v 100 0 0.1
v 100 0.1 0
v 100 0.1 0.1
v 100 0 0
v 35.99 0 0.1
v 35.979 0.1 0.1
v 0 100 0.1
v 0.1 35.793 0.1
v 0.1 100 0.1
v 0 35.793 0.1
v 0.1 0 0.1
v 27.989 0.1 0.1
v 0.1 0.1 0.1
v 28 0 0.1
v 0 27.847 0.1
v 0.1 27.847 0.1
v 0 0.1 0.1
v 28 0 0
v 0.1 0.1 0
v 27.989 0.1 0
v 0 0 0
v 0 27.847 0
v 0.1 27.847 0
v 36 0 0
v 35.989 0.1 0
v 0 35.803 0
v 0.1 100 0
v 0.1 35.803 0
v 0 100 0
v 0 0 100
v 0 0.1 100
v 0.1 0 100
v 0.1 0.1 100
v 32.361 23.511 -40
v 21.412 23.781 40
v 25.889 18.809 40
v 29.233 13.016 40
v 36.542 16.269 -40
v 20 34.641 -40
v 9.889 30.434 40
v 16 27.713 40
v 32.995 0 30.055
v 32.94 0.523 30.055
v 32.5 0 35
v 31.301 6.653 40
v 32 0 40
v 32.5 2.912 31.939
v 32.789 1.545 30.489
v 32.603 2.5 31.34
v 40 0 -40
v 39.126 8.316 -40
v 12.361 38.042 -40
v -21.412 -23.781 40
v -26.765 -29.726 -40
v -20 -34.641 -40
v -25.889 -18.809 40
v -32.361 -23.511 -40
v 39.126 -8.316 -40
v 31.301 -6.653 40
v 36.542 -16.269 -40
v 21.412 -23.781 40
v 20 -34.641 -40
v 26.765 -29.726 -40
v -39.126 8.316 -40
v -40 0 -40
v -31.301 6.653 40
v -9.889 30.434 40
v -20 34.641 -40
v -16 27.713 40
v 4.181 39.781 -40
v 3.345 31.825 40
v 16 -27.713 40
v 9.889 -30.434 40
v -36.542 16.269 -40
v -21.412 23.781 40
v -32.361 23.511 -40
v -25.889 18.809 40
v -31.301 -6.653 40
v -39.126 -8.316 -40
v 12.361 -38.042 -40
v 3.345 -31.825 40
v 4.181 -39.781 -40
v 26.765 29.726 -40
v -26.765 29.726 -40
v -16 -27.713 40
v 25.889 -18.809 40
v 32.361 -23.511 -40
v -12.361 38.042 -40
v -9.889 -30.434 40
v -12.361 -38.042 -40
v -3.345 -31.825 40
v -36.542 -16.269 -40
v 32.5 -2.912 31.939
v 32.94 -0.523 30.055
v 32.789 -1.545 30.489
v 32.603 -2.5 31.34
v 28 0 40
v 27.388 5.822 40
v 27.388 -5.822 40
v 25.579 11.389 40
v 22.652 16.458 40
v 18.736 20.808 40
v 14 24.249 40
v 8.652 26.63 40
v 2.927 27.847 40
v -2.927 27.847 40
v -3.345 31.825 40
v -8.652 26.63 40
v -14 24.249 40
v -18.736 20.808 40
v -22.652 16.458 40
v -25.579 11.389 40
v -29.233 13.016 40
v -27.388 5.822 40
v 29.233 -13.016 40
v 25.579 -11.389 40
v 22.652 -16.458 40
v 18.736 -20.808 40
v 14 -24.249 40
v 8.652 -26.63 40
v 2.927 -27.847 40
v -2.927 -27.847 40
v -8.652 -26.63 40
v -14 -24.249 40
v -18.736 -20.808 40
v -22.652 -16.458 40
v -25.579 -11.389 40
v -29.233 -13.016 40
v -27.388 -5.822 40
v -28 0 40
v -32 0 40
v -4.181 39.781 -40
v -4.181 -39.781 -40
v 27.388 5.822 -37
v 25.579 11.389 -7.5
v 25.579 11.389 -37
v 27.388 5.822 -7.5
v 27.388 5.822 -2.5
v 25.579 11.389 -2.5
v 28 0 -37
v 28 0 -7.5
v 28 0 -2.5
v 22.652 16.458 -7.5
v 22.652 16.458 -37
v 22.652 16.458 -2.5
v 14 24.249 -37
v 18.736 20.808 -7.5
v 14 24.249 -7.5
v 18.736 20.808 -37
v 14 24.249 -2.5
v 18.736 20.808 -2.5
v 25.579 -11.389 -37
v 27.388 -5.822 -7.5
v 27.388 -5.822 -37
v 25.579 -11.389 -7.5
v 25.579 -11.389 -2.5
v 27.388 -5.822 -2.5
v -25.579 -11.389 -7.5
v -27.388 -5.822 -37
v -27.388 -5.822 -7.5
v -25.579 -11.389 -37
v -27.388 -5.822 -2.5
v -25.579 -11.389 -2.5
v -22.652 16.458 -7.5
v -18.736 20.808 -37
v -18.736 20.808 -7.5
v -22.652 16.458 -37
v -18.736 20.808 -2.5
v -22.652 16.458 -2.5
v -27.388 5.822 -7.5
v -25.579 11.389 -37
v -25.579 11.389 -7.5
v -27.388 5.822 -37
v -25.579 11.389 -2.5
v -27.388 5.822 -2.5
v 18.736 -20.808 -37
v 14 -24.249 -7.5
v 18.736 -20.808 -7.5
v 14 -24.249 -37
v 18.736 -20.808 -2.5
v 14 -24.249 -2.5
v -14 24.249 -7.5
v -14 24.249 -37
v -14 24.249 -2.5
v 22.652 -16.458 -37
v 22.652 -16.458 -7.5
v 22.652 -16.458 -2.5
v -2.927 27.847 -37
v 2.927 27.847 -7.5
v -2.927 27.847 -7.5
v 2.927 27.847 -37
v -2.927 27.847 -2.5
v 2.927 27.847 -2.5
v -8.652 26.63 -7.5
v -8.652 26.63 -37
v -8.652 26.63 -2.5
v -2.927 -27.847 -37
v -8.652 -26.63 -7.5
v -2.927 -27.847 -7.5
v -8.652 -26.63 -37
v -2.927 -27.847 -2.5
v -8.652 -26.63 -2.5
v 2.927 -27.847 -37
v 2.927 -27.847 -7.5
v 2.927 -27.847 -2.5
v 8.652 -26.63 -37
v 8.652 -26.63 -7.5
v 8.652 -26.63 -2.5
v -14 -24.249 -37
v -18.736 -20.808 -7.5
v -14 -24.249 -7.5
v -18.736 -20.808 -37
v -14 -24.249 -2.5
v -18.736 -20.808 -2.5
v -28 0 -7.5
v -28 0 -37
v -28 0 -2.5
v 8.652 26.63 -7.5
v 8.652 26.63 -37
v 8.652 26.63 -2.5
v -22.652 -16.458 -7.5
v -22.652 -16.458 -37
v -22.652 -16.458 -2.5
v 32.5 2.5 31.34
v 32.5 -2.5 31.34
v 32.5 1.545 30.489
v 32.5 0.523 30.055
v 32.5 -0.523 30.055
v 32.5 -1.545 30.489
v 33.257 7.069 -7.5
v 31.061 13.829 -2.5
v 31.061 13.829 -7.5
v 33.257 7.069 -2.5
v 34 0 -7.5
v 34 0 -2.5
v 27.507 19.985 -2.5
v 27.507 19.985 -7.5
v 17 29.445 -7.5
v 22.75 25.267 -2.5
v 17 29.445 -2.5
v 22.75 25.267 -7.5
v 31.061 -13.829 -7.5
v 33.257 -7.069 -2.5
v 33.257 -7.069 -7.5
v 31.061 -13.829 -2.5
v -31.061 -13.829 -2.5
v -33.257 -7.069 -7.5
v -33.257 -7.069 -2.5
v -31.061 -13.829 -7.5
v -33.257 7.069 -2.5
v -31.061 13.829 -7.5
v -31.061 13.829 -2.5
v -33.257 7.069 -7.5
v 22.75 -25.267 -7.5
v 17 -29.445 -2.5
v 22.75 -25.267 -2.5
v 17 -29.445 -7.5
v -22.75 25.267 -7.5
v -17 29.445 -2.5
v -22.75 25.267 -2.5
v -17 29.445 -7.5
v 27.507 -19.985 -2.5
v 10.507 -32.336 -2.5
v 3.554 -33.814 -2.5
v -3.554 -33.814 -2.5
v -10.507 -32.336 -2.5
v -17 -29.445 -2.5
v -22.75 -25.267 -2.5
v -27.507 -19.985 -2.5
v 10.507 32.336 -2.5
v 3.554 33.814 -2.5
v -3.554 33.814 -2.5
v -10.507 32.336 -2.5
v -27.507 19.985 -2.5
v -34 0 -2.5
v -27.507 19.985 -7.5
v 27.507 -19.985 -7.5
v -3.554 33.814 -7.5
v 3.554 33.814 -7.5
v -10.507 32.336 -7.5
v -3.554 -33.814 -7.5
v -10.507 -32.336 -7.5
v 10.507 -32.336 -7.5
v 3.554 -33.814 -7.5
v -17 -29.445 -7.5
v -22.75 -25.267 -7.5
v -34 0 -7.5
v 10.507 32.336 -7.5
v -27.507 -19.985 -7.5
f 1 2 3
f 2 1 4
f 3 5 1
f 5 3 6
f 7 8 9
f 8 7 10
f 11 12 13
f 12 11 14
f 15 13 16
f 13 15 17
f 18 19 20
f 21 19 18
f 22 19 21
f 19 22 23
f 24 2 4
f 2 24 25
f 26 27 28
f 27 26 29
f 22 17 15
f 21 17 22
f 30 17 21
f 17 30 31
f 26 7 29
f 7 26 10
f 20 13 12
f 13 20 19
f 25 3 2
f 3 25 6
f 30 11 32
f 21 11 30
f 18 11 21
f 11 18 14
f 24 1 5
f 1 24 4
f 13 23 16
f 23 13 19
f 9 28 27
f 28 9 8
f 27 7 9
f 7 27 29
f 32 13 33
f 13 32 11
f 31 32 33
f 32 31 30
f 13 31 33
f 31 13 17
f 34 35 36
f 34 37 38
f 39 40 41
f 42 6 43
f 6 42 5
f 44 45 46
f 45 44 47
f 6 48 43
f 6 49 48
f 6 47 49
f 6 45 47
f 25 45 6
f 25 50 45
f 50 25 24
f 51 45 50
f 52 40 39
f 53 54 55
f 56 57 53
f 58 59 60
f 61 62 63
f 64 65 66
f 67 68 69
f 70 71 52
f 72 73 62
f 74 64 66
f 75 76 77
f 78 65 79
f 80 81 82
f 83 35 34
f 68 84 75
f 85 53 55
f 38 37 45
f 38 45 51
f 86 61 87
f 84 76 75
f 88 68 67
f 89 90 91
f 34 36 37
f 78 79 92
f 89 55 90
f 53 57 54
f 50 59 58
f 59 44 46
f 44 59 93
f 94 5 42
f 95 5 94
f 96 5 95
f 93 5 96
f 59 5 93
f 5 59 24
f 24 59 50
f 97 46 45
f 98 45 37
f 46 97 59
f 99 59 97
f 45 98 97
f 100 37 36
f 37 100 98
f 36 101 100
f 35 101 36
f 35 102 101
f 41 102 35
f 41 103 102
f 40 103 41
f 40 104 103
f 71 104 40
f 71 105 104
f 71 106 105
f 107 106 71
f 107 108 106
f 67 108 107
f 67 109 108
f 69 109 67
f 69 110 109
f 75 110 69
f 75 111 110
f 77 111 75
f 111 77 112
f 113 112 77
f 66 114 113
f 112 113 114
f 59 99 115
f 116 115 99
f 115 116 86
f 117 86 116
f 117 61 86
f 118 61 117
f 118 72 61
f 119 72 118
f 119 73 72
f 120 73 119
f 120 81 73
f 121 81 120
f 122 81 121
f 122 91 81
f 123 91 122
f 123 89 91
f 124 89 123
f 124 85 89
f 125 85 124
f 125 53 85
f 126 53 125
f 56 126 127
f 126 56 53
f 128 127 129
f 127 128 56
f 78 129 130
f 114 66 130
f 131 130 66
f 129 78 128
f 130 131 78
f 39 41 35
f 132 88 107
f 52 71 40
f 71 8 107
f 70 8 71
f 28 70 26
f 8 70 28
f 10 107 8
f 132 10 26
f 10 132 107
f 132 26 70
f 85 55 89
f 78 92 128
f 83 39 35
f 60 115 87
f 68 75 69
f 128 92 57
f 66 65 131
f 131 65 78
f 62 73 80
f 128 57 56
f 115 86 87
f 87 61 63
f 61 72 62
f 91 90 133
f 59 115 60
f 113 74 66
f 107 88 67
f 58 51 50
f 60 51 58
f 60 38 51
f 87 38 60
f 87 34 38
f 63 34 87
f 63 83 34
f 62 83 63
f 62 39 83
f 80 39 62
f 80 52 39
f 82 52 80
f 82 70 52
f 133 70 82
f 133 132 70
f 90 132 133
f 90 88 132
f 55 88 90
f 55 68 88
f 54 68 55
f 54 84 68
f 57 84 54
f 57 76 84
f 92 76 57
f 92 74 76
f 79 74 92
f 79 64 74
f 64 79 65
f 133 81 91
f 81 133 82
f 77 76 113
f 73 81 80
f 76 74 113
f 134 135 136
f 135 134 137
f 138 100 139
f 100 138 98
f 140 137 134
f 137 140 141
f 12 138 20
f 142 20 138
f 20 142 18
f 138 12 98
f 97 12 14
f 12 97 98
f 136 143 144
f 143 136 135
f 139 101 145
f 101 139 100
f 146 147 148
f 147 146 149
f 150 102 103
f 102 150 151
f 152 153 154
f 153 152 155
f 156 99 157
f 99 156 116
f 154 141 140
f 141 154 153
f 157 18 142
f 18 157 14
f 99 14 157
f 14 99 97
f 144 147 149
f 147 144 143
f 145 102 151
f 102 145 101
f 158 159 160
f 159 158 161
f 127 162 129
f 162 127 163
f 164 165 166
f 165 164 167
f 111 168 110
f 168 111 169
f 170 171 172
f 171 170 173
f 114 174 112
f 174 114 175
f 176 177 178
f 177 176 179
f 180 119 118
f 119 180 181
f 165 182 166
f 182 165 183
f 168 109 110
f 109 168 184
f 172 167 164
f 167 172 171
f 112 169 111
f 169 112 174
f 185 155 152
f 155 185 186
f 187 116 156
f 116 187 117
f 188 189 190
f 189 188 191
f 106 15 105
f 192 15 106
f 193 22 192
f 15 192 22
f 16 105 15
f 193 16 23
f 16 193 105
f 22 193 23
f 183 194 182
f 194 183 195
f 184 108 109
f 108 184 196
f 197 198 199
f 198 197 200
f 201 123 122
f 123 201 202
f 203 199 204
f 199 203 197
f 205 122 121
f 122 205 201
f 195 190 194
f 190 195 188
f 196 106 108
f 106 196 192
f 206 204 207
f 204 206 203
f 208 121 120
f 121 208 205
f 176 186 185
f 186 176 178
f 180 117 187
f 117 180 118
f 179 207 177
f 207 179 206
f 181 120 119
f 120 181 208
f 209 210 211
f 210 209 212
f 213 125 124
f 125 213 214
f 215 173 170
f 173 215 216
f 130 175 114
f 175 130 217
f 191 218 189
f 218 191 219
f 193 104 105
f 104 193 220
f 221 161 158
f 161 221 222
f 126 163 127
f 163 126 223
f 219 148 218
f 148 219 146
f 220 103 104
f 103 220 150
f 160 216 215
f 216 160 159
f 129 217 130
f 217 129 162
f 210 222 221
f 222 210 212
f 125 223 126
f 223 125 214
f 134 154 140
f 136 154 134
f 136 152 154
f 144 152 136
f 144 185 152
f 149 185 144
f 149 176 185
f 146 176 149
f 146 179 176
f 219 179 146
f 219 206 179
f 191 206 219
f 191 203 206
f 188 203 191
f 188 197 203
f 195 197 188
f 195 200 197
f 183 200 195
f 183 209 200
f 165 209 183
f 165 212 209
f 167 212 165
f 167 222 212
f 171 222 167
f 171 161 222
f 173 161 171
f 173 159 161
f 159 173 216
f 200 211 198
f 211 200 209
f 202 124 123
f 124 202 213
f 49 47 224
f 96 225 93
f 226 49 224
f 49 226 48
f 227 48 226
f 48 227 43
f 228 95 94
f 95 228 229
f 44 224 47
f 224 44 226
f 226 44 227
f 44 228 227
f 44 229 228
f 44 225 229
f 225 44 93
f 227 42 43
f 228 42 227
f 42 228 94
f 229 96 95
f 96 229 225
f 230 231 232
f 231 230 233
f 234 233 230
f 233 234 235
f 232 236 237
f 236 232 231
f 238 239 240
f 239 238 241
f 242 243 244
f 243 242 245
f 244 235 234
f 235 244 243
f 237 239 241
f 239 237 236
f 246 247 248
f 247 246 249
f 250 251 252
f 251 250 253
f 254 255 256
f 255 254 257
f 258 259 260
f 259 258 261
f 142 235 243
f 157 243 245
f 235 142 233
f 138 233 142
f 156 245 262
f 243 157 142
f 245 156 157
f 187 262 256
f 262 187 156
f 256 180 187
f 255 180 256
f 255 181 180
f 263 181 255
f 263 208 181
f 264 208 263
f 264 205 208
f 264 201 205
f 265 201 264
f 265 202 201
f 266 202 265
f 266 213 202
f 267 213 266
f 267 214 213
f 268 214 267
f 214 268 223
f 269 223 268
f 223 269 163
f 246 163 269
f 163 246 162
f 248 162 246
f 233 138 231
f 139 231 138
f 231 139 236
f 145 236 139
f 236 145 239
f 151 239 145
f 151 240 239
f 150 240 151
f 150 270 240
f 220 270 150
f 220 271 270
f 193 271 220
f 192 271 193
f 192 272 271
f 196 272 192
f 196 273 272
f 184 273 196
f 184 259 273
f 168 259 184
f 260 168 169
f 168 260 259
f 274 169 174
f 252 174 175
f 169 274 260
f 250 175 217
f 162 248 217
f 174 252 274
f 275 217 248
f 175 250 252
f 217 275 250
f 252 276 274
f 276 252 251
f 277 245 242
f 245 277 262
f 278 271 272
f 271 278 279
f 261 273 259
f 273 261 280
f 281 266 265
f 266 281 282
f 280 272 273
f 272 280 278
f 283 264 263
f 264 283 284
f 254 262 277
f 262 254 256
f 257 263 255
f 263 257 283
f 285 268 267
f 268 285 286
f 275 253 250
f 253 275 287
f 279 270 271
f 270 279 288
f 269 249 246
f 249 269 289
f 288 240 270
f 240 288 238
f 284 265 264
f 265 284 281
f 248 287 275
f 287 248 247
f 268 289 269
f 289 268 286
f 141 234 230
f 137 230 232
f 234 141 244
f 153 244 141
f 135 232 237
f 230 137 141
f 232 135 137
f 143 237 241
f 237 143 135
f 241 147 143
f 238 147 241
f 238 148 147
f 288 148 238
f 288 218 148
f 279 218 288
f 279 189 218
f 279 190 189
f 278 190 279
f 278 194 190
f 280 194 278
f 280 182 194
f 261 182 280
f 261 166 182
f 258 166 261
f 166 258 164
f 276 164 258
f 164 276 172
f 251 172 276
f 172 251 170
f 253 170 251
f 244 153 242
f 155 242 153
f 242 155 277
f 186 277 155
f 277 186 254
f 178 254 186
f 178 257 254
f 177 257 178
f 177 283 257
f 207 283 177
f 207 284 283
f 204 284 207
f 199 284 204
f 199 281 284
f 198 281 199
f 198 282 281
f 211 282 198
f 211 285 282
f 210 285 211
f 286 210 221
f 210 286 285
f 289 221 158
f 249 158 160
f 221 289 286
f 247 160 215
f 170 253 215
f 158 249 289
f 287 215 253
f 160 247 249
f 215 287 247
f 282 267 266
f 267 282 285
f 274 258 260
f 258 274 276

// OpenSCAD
    // Combined Scene

    // Permanent Model
    
    // Permanent Model (Black)
    color([0, 0, 0]) {
        // Your permanent model code here
        cube([100,0.1,0.1], center = false);
        cube([0.1,100,0.1], center = false);
        cube([0.1,0.1,100], center = false);
    }
    

    // Dynamic Model
    difference() {
    // Outer mug body with a flared rim and tapered shape for aesthetics
    difference() {
        // Outer shape with a larger top diameter and tapered bottom
        cylinder(h=80, r1=40, r2=32, center=true);
        // Inner hollow space for fluid containment
        translate([0, 0, 2])
            cylinder(h=78, r=28, center=true);
    }
    
    // Handle of the mug
    translate([40, 0, 40])
        rotate([90, 0, 0])
            difference() {
                // Outer part of handle
                scale([1, 1, 0.5])
                    rotate([0, 90, 0]) 
                    cylinder(h=15, r=10, center=true);
                
                // Inner cutout of handle
                translate([-6, -6, -7])
                    scale([1, 1, 0.5])
                        rotate([0, 90, 0]) 
                        cylinder(h=20, r=8, center=true);
            }

    // Slightly rounded base for stability
    translate([0, 0, -5])
        cylinder(h=5, r=34, center=true);

    // Fillet the top rim for comfort
    translate([0, 0, 80])
        cylinder(h=4, r=40, center=true);
    translate([0, 0, 80])
        cylinder(h=4, r=32, center=true);
}
    
